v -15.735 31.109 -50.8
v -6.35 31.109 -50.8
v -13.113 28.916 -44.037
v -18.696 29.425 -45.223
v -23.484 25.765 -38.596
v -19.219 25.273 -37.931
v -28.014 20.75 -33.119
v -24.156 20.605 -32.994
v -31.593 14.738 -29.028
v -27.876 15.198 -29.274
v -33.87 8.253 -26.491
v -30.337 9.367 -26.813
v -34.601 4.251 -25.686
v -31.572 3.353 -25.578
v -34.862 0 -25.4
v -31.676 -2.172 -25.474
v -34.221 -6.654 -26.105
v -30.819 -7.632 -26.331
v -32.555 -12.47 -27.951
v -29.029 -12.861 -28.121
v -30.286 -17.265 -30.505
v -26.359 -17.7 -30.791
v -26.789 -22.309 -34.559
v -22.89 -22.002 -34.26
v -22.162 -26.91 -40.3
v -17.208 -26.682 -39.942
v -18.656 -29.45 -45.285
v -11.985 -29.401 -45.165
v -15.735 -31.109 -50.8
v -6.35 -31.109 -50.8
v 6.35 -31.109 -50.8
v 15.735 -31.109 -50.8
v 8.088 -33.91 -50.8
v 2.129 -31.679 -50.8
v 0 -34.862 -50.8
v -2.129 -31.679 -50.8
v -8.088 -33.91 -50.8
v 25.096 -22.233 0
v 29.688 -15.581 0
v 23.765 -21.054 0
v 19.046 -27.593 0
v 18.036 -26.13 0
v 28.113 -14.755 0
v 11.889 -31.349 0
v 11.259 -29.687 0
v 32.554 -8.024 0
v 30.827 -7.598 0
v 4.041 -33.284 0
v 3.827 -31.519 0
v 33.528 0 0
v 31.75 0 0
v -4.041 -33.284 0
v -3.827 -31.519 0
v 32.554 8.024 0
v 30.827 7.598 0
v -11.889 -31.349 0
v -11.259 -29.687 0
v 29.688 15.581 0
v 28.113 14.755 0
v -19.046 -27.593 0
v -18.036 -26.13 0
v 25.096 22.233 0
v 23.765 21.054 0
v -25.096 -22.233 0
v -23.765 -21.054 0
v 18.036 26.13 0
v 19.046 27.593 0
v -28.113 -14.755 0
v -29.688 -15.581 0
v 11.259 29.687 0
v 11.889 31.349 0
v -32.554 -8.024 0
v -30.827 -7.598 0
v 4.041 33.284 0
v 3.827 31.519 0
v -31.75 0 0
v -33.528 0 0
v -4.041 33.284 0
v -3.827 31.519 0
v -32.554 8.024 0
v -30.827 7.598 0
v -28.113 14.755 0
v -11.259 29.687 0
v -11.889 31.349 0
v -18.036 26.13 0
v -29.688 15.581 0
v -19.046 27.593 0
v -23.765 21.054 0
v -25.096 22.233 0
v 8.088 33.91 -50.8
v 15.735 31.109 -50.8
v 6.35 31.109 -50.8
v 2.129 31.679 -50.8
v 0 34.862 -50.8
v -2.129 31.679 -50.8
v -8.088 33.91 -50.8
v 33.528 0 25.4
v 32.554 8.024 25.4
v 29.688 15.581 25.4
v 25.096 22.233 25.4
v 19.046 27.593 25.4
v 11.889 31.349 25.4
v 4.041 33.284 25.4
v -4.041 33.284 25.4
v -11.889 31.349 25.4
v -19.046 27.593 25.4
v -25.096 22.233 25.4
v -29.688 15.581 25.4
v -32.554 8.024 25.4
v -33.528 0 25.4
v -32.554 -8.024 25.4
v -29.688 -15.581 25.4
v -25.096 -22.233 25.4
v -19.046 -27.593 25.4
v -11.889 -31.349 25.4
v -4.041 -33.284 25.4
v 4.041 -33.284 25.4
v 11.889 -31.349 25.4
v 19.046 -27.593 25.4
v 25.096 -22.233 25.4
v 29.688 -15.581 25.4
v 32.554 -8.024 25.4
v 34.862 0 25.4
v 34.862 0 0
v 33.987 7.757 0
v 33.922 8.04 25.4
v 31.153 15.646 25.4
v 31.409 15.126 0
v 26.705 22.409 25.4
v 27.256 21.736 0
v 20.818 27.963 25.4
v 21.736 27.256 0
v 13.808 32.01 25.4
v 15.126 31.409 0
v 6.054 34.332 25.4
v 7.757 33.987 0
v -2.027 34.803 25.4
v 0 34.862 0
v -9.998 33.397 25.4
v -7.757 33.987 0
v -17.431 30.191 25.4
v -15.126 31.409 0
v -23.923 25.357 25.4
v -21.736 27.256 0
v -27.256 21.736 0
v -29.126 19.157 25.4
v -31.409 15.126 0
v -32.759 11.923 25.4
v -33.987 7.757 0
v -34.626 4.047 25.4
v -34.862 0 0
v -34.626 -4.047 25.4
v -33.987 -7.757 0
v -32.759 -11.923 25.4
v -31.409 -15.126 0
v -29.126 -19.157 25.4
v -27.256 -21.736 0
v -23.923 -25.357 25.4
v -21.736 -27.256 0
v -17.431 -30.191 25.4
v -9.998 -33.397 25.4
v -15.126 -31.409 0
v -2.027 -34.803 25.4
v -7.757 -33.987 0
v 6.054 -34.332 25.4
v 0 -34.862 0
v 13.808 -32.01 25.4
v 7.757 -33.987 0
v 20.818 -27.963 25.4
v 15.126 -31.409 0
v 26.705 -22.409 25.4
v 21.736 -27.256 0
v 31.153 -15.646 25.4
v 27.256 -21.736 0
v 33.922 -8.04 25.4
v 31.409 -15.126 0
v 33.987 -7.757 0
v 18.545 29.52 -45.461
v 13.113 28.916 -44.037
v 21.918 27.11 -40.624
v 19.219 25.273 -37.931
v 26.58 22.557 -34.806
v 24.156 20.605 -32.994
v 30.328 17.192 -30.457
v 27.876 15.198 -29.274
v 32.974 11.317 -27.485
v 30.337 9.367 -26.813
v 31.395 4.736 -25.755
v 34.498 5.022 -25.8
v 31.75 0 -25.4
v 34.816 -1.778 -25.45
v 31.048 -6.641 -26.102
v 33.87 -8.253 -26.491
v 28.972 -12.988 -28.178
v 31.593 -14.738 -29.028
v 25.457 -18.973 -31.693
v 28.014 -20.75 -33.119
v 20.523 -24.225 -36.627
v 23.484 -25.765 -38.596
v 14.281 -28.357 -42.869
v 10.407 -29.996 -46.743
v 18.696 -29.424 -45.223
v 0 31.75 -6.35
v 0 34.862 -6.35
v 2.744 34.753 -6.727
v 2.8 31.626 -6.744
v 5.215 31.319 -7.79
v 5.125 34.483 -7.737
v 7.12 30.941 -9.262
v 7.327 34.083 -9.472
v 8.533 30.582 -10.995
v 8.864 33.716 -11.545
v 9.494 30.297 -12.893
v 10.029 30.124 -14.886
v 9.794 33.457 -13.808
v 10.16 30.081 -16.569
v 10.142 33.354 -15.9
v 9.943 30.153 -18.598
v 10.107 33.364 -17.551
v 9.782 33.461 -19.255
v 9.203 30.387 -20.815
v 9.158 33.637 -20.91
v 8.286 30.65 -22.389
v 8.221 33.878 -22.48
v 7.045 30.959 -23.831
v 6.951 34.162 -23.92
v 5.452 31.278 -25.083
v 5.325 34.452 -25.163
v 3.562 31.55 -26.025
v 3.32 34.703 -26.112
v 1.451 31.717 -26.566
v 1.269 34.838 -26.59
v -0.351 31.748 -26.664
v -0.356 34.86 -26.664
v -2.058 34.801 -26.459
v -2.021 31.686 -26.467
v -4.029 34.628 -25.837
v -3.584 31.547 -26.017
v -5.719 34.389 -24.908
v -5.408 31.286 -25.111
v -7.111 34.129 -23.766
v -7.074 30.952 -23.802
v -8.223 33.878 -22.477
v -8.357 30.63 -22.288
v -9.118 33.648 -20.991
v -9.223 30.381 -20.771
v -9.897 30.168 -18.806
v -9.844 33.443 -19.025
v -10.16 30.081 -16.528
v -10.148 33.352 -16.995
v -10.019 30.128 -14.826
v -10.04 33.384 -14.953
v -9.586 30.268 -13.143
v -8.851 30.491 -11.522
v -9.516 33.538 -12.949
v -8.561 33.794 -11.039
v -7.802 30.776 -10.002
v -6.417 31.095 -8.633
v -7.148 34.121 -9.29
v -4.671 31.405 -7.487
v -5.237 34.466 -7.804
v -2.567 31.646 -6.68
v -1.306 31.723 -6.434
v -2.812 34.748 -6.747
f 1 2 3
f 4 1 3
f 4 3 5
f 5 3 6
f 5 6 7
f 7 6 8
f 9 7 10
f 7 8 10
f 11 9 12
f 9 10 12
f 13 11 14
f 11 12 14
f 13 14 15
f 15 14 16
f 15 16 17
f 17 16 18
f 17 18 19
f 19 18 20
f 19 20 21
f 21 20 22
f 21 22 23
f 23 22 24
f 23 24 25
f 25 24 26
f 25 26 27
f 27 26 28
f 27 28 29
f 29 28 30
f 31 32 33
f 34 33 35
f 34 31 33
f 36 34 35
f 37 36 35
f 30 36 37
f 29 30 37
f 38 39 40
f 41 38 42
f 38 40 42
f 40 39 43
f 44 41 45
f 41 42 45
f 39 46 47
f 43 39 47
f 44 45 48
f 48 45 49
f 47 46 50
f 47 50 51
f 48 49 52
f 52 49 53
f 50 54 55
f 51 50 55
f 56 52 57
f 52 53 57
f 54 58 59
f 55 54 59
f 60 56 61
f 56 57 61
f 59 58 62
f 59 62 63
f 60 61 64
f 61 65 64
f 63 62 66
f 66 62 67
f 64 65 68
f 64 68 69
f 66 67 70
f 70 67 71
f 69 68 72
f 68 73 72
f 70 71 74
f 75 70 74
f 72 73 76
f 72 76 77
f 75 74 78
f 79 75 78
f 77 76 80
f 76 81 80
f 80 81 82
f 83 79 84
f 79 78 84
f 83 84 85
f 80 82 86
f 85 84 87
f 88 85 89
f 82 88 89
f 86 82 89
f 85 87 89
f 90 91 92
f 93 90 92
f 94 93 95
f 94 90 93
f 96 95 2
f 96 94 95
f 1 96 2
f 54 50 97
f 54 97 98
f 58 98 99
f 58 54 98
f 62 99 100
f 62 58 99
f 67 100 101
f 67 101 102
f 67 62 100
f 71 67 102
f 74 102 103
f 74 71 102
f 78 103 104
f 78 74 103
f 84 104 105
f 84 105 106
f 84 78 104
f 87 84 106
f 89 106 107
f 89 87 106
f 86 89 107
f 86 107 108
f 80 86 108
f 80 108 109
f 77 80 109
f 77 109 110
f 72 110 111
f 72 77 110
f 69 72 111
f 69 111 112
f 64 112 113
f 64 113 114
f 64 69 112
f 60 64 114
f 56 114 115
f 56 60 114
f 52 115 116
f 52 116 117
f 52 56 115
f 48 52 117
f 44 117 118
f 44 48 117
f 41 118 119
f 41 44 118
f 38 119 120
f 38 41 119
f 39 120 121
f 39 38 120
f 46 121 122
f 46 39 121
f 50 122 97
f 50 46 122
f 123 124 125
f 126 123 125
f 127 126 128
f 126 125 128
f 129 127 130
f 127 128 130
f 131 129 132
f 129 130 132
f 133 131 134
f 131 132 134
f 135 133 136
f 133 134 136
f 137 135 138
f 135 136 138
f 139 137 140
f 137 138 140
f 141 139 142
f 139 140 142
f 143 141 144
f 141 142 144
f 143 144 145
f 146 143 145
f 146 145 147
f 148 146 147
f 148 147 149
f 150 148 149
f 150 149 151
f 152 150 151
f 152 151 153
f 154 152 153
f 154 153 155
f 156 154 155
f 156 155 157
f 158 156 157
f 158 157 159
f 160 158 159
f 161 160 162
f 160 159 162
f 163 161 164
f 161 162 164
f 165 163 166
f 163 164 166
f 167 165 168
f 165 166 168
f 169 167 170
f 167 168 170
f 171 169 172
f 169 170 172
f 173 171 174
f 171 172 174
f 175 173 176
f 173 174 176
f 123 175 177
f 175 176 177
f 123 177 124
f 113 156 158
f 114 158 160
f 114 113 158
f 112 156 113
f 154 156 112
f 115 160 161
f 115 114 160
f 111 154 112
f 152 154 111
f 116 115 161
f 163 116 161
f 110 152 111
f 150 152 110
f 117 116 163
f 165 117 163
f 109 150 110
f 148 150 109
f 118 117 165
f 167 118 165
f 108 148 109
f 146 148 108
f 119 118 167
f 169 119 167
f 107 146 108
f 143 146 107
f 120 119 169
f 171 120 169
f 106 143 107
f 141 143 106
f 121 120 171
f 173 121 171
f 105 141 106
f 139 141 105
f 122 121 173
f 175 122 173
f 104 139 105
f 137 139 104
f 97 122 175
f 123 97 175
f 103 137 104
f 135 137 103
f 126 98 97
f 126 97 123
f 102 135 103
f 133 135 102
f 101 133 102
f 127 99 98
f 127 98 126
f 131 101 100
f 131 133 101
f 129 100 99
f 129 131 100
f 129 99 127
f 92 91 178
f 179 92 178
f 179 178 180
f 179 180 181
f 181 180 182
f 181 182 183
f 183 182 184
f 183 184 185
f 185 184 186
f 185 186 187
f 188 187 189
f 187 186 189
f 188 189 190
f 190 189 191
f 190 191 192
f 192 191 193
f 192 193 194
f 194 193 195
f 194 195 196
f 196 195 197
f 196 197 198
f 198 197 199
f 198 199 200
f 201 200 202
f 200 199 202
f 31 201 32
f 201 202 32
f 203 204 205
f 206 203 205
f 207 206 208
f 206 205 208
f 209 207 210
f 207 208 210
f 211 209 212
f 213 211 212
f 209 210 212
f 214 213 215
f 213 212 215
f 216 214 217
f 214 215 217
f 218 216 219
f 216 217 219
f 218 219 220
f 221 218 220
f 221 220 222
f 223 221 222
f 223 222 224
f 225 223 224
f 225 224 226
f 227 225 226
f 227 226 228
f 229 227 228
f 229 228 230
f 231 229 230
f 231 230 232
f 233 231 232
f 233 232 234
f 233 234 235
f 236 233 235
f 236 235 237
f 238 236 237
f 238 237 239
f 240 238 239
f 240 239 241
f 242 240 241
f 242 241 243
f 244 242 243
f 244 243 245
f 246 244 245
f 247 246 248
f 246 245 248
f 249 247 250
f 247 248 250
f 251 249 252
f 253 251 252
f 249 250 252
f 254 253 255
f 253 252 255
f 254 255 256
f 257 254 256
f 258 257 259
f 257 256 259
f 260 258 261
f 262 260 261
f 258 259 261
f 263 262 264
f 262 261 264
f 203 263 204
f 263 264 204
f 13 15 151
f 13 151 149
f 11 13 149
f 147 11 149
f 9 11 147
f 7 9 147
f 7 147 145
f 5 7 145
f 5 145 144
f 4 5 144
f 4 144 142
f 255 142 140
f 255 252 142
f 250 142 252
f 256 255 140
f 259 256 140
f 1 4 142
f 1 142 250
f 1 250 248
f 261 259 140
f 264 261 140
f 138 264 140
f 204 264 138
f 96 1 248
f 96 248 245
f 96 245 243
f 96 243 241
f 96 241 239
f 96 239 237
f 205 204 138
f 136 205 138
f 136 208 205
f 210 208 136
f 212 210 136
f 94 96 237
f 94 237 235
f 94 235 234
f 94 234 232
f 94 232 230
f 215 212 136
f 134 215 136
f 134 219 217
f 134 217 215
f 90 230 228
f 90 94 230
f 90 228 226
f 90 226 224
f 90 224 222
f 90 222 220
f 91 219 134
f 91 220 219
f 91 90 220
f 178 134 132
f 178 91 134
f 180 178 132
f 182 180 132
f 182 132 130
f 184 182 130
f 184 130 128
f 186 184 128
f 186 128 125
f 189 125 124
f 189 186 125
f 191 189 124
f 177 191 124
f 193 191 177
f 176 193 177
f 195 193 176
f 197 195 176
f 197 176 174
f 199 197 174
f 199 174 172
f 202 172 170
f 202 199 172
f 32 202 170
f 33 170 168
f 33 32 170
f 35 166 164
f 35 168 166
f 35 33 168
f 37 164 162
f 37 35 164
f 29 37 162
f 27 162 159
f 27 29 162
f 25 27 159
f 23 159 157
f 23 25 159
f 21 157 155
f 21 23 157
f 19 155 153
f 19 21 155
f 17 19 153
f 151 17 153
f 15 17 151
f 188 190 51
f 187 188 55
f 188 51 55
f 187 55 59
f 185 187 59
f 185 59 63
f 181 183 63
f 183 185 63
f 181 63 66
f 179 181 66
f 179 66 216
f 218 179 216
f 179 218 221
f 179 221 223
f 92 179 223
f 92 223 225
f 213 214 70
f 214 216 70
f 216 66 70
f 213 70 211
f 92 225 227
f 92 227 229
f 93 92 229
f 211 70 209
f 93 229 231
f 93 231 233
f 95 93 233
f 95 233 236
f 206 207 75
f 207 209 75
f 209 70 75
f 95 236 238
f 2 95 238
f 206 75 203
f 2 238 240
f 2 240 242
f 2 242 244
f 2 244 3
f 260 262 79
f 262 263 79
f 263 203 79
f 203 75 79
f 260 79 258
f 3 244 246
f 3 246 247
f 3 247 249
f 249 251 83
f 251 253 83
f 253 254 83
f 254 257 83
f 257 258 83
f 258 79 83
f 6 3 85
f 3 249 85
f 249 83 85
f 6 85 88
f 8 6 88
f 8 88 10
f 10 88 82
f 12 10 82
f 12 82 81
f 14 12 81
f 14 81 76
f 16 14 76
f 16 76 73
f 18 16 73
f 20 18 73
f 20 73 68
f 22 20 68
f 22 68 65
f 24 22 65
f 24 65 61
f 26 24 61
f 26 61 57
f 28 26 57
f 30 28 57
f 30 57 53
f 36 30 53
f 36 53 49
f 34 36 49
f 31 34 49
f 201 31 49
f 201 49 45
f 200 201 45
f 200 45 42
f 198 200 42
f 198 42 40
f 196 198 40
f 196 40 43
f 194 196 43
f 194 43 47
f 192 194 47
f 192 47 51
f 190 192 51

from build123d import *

# Parameters (mm, degrees)
SKETCH2_R               = 34.8615
SKETCH2_R_2             = 33.528
BOSS_EXTRUDE1_DEPTH     = 25.4
BOSS_EXTRUDE2_START     = 50.8
SKETCH3_R               = 34.8615
BOSS_EXTRUDE2_DEPTH     = 50.8
SKETCH4_R               = 31.75
CUT_EXTRUDE2_DEPTH      = 94.044402901
SKETCH6_R               = 31.75
CUT_EXTRUDE4_DEPTH      = 50.8
CUT_EXTRUDE5_REACH      = 95.044
CUT_EXTRUDE5_END_RADIUS = 31.75
SKETCH7_R               = 10.16


with BuildPart() as part:
    # Sketch2 → Boss-Extrude1 (new body)
    with BuildSketch(Plane.XY):
        Circle(SKETCH2_R)
        Circle(SKETCH2_R_2, mode=Mode.SUBTRACT)
    extrude(amount=BOSS_EXTRUDE1_DEPTH)

    # Sketch3 → Boss-Extrude2 (add)
    with BuildSketch(Plane(origin=(0, 0, 0), x_dir=(-1, 0, 0), z_dir=(0, 0, -1)).offset(BOSS_EXTRUDE2_START)):
        Circle(SKETCH3_R)
    extrude(amount=-BOSS_EXTRUDE2_DEPTH)

    # Sketch4 → Cut-Extrude2 (cut, through all)
    with BuildSketch(Plane(origin=(34.8615, 0, 0), x_dir=(0, 0, -1), z_dir=(1, 0, 0))):
        with Locations((57.15, 0)):
            Circle(SKETCH4_R)
    extrude(amount=-CUT_EXTRUDE2_DEPTH, mode=Mode.SUBTRACT)

    # Sketch6 → Cut-Extrude4 (cut)
    with BuildSketch(Plane.XY):
        Circle(SKETCH6_R)
    extrude(amount=-CUT_EXTRUDE4_DEPTH, mode=Mode.SUBTRACT)

    # Cut-Extrude5: up to this cylinder (the profile starts outside it)
    cut_extrude5_end = Plane(origin=(0, 0, -16.51), z_dir=(0, 0, 1)) * Cylinder(CUT_EXTRUDE5_END_RADIUS, 254.588, mode=Mode.PRIVATE)
    # Sketch7 → Cut-Extrude5 (cut, up to the surface)
    with BuildSketch(Plane(origin=(0, 34.8615, 0), x_dir=(-1, 0, 0), z_dir=(0, 1, 0)), mode=Mode.PRIVATE) as cut_extrude5_sk1:
        with Locations(Location((0, -16.51, 0), (0, 0, 90))):
            Circle(SKETCH7_R)
    cut_extrude5_tool1 = extrude(cut_extrude5_sk1.sketch, amount=-CUT_EXTRUDE5_REACH, mode=Mode.PRIVATE) - cut_extrude5_end
    add(cut_extrude5_tool1.solids().sort_by_distance((0, 34.8615, -16.51))[0], mode=Mode.SUBTRACT)


solid = part.part
